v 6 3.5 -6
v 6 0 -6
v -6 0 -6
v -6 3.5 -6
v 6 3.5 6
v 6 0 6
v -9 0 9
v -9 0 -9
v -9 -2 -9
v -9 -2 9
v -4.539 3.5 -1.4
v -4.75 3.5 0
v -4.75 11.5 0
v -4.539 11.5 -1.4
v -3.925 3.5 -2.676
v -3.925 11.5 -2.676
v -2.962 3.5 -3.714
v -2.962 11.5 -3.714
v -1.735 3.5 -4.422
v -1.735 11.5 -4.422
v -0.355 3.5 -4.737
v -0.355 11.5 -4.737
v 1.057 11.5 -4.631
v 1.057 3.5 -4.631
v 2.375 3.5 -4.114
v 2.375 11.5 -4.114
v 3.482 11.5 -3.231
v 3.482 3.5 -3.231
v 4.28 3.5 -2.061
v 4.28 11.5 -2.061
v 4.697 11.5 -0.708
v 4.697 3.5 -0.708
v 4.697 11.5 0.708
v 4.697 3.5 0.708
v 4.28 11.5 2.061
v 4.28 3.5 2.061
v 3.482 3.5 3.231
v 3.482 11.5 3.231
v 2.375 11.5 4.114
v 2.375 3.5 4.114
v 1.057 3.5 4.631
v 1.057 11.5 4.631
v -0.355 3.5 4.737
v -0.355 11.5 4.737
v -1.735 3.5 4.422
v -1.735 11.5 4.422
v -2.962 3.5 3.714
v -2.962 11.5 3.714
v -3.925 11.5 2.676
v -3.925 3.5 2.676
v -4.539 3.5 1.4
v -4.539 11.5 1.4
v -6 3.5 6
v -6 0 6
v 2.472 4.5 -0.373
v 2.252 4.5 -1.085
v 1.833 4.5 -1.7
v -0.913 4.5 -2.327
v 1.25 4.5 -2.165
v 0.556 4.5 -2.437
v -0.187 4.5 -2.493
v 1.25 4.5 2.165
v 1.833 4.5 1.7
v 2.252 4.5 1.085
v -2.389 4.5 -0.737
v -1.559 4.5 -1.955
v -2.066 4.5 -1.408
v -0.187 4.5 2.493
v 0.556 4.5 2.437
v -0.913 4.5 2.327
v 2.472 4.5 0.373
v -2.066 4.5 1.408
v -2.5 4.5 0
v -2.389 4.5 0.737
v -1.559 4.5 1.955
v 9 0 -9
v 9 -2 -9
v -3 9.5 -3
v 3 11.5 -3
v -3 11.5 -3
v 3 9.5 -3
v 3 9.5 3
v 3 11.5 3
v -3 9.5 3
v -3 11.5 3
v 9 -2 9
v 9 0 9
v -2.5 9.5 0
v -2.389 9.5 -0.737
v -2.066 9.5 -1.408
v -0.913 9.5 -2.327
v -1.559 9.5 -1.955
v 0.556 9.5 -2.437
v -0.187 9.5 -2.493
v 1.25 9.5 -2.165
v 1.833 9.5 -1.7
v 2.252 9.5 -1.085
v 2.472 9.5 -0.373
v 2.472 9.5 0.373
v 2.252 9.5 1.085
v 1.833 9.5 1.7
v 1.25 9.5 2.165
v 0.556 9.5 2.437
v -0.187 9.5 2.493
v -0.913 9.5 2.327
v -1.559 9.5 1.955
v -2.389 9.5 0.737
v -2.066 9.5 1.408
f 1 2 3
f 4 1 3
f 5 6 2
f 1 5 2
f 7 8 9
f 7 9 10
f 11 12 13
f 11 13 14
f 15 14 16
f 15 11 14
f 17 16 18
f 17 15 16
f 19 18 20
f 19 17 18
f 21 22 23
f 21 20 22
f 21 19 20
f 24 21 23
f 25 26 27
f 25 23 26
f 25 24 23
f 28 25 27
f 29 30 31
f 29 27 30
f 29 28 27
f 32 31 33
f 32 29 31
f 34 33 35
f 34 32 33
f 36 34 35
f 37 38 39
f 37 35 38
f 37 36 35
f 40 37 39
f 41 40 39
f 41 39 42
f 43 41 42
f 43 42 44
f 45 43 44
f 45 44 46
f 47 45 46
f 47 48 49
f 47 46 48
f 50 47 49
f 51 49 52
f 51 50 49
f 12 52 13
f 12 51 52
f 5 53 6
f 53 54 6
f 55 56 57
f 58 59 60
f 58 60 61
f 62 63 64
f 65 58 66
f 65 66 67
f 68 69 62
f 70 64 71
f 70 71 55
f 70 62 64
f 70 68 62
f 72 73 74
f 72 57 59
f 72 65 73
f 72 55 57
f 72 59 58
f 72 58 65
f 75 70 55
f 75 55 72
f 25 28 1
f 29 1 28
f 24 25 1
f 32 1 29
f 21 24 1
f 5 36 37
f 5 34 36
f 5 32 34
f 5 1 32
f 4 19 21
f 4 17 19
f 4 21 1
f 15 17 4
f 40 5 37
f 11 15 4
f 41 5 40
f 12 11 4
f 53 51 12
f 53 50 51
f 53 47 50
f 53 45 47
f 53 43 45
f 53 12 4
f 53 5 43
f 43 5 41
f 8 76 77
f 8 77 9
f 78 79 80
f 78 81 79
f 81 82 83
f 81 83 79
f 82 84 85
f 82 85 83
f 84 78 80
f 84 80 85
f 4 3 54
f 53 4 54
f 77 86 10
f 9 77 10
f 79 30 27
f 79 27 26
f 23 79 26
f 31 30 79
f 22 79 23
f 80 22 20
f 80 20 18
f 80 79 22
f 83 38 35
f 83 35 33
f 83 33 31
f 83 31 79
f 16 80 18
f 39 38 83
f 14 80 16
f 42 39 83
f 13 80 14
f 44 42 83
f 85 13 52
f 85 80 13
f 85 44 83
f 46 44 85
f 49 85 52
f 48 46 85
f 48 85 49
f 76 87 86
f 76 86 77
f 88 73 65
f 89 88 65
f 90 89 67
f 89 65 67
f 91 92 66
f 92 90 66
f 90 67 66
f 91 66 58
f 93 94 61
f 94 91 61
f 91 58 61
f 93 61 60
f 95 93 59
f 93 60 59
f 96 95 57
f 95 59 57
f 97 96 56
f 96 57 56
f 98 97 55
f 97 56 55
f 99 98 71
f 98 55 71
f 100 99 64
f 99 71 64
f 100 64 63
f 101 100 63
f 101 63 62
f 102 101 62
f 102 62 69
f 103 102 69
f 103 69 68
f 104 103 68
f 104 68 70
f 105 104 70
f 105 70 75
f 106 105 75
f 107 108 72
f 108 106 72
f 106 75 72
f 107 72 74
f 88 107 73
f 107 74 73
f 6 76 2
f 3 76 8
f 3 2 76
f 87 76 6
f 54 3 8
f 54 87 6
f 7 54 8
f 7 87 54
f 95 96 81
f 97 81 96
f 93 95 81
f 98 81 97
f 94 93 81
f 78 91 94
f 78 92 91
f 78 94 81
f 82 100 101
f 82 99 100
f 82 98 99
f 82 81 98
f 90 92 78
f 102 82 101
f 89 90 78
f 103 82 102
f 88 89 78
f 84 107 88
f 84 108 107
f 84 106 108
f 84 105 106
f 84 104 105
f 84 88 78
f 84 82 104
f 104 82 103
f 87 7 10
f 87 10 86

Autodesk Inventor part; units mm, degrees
ref_plane "YZ Plane" through (0, 0, 0) normal (1, 0, 0) x (0, 1, 0)
ref_plane "XZ Plane" through (0, 0, 0) normal (0, 1, 0) x (-1, 0, 0)
ref_plane "XY Plane" through (0, 0, 0) normal (0, 0, 1) x (1, 0, 0)
sketch "Sketch1" plane through (0, 0, 0) normal (0, 1, 0) x (-1, 0, 0)
  circle A0 centre (0, 0) radius 2.5
  circle A1 centre (0, 0) radius 4.75
  line L0 (3, 3) -> (-3, 3)
  line L1 (-3, 3) -> (-3, -3)
  line L2 (-3, -3) -> (3, -3)
  line L3 (3, -3) -> (3, 3)
  line L4 (3, 3) -> (-3, -3) construction
  line L5 (-3, 3) -> (3, -3) construction
  line L6 (6, 6) -> (-6, 6)
  line L7 (-6, 6) -> (-6, -6)
  line L8 (-6, -6) -> (6, -6)
  line L9 (6, -6) -> (6, 6)
  line L10 (6, 6) -> (-6, -6) construction
  line L11 (-6, 6) -> (6, -6) construction
  line L12 (9, 9) -> (-9, 9)
  line L13 (-9, 9) -> (-9, -9)
  line L14 (-9, -9) -> (9, -9)
  line L15 (9, -9) -> (9, 9)
  line L16 (9, 9) -> (-9, -9) construction
  line L17 (-9, 9) -> (9, -9) construction
  dimension "d9" = 5
  dimension "d10" = 9.5
  dimension "d11" = 6
  dimension "d12" = 6
  dimension "d13" = 12
  dimension "d14" = 12
  dimension "d15" = 18
extrude "Extrusion1" add sketch "Sketch1" against normal blind 2 contours A0 | A1 | L3 L2 L1 L0 | L9 L8 L7 L6 | L15 L14 L13 L12
extrude "Extrusion2" add sketch "Sketch1" along normal blind 3.5 contours L9 L8 L7 L6
extrude "Extrusion3" add sketch "Sketch1" along normal blind 11.5 contours A1
extrude "Extrusion4" add sketch "Sketch1" along normal blind 9.5 contours L3 L2 L1 L0
extrude "Extrusion5" add sketch "Sketch1" along normal blind 4.5 contours A0
equation "\"d13\" = PIVOT_SQUARE"
equation "\"d14\" = PIVOT_SQUARE"
equation "\"PIVOT_SQUARE\" = 12"
properties part number "HexPivot"
